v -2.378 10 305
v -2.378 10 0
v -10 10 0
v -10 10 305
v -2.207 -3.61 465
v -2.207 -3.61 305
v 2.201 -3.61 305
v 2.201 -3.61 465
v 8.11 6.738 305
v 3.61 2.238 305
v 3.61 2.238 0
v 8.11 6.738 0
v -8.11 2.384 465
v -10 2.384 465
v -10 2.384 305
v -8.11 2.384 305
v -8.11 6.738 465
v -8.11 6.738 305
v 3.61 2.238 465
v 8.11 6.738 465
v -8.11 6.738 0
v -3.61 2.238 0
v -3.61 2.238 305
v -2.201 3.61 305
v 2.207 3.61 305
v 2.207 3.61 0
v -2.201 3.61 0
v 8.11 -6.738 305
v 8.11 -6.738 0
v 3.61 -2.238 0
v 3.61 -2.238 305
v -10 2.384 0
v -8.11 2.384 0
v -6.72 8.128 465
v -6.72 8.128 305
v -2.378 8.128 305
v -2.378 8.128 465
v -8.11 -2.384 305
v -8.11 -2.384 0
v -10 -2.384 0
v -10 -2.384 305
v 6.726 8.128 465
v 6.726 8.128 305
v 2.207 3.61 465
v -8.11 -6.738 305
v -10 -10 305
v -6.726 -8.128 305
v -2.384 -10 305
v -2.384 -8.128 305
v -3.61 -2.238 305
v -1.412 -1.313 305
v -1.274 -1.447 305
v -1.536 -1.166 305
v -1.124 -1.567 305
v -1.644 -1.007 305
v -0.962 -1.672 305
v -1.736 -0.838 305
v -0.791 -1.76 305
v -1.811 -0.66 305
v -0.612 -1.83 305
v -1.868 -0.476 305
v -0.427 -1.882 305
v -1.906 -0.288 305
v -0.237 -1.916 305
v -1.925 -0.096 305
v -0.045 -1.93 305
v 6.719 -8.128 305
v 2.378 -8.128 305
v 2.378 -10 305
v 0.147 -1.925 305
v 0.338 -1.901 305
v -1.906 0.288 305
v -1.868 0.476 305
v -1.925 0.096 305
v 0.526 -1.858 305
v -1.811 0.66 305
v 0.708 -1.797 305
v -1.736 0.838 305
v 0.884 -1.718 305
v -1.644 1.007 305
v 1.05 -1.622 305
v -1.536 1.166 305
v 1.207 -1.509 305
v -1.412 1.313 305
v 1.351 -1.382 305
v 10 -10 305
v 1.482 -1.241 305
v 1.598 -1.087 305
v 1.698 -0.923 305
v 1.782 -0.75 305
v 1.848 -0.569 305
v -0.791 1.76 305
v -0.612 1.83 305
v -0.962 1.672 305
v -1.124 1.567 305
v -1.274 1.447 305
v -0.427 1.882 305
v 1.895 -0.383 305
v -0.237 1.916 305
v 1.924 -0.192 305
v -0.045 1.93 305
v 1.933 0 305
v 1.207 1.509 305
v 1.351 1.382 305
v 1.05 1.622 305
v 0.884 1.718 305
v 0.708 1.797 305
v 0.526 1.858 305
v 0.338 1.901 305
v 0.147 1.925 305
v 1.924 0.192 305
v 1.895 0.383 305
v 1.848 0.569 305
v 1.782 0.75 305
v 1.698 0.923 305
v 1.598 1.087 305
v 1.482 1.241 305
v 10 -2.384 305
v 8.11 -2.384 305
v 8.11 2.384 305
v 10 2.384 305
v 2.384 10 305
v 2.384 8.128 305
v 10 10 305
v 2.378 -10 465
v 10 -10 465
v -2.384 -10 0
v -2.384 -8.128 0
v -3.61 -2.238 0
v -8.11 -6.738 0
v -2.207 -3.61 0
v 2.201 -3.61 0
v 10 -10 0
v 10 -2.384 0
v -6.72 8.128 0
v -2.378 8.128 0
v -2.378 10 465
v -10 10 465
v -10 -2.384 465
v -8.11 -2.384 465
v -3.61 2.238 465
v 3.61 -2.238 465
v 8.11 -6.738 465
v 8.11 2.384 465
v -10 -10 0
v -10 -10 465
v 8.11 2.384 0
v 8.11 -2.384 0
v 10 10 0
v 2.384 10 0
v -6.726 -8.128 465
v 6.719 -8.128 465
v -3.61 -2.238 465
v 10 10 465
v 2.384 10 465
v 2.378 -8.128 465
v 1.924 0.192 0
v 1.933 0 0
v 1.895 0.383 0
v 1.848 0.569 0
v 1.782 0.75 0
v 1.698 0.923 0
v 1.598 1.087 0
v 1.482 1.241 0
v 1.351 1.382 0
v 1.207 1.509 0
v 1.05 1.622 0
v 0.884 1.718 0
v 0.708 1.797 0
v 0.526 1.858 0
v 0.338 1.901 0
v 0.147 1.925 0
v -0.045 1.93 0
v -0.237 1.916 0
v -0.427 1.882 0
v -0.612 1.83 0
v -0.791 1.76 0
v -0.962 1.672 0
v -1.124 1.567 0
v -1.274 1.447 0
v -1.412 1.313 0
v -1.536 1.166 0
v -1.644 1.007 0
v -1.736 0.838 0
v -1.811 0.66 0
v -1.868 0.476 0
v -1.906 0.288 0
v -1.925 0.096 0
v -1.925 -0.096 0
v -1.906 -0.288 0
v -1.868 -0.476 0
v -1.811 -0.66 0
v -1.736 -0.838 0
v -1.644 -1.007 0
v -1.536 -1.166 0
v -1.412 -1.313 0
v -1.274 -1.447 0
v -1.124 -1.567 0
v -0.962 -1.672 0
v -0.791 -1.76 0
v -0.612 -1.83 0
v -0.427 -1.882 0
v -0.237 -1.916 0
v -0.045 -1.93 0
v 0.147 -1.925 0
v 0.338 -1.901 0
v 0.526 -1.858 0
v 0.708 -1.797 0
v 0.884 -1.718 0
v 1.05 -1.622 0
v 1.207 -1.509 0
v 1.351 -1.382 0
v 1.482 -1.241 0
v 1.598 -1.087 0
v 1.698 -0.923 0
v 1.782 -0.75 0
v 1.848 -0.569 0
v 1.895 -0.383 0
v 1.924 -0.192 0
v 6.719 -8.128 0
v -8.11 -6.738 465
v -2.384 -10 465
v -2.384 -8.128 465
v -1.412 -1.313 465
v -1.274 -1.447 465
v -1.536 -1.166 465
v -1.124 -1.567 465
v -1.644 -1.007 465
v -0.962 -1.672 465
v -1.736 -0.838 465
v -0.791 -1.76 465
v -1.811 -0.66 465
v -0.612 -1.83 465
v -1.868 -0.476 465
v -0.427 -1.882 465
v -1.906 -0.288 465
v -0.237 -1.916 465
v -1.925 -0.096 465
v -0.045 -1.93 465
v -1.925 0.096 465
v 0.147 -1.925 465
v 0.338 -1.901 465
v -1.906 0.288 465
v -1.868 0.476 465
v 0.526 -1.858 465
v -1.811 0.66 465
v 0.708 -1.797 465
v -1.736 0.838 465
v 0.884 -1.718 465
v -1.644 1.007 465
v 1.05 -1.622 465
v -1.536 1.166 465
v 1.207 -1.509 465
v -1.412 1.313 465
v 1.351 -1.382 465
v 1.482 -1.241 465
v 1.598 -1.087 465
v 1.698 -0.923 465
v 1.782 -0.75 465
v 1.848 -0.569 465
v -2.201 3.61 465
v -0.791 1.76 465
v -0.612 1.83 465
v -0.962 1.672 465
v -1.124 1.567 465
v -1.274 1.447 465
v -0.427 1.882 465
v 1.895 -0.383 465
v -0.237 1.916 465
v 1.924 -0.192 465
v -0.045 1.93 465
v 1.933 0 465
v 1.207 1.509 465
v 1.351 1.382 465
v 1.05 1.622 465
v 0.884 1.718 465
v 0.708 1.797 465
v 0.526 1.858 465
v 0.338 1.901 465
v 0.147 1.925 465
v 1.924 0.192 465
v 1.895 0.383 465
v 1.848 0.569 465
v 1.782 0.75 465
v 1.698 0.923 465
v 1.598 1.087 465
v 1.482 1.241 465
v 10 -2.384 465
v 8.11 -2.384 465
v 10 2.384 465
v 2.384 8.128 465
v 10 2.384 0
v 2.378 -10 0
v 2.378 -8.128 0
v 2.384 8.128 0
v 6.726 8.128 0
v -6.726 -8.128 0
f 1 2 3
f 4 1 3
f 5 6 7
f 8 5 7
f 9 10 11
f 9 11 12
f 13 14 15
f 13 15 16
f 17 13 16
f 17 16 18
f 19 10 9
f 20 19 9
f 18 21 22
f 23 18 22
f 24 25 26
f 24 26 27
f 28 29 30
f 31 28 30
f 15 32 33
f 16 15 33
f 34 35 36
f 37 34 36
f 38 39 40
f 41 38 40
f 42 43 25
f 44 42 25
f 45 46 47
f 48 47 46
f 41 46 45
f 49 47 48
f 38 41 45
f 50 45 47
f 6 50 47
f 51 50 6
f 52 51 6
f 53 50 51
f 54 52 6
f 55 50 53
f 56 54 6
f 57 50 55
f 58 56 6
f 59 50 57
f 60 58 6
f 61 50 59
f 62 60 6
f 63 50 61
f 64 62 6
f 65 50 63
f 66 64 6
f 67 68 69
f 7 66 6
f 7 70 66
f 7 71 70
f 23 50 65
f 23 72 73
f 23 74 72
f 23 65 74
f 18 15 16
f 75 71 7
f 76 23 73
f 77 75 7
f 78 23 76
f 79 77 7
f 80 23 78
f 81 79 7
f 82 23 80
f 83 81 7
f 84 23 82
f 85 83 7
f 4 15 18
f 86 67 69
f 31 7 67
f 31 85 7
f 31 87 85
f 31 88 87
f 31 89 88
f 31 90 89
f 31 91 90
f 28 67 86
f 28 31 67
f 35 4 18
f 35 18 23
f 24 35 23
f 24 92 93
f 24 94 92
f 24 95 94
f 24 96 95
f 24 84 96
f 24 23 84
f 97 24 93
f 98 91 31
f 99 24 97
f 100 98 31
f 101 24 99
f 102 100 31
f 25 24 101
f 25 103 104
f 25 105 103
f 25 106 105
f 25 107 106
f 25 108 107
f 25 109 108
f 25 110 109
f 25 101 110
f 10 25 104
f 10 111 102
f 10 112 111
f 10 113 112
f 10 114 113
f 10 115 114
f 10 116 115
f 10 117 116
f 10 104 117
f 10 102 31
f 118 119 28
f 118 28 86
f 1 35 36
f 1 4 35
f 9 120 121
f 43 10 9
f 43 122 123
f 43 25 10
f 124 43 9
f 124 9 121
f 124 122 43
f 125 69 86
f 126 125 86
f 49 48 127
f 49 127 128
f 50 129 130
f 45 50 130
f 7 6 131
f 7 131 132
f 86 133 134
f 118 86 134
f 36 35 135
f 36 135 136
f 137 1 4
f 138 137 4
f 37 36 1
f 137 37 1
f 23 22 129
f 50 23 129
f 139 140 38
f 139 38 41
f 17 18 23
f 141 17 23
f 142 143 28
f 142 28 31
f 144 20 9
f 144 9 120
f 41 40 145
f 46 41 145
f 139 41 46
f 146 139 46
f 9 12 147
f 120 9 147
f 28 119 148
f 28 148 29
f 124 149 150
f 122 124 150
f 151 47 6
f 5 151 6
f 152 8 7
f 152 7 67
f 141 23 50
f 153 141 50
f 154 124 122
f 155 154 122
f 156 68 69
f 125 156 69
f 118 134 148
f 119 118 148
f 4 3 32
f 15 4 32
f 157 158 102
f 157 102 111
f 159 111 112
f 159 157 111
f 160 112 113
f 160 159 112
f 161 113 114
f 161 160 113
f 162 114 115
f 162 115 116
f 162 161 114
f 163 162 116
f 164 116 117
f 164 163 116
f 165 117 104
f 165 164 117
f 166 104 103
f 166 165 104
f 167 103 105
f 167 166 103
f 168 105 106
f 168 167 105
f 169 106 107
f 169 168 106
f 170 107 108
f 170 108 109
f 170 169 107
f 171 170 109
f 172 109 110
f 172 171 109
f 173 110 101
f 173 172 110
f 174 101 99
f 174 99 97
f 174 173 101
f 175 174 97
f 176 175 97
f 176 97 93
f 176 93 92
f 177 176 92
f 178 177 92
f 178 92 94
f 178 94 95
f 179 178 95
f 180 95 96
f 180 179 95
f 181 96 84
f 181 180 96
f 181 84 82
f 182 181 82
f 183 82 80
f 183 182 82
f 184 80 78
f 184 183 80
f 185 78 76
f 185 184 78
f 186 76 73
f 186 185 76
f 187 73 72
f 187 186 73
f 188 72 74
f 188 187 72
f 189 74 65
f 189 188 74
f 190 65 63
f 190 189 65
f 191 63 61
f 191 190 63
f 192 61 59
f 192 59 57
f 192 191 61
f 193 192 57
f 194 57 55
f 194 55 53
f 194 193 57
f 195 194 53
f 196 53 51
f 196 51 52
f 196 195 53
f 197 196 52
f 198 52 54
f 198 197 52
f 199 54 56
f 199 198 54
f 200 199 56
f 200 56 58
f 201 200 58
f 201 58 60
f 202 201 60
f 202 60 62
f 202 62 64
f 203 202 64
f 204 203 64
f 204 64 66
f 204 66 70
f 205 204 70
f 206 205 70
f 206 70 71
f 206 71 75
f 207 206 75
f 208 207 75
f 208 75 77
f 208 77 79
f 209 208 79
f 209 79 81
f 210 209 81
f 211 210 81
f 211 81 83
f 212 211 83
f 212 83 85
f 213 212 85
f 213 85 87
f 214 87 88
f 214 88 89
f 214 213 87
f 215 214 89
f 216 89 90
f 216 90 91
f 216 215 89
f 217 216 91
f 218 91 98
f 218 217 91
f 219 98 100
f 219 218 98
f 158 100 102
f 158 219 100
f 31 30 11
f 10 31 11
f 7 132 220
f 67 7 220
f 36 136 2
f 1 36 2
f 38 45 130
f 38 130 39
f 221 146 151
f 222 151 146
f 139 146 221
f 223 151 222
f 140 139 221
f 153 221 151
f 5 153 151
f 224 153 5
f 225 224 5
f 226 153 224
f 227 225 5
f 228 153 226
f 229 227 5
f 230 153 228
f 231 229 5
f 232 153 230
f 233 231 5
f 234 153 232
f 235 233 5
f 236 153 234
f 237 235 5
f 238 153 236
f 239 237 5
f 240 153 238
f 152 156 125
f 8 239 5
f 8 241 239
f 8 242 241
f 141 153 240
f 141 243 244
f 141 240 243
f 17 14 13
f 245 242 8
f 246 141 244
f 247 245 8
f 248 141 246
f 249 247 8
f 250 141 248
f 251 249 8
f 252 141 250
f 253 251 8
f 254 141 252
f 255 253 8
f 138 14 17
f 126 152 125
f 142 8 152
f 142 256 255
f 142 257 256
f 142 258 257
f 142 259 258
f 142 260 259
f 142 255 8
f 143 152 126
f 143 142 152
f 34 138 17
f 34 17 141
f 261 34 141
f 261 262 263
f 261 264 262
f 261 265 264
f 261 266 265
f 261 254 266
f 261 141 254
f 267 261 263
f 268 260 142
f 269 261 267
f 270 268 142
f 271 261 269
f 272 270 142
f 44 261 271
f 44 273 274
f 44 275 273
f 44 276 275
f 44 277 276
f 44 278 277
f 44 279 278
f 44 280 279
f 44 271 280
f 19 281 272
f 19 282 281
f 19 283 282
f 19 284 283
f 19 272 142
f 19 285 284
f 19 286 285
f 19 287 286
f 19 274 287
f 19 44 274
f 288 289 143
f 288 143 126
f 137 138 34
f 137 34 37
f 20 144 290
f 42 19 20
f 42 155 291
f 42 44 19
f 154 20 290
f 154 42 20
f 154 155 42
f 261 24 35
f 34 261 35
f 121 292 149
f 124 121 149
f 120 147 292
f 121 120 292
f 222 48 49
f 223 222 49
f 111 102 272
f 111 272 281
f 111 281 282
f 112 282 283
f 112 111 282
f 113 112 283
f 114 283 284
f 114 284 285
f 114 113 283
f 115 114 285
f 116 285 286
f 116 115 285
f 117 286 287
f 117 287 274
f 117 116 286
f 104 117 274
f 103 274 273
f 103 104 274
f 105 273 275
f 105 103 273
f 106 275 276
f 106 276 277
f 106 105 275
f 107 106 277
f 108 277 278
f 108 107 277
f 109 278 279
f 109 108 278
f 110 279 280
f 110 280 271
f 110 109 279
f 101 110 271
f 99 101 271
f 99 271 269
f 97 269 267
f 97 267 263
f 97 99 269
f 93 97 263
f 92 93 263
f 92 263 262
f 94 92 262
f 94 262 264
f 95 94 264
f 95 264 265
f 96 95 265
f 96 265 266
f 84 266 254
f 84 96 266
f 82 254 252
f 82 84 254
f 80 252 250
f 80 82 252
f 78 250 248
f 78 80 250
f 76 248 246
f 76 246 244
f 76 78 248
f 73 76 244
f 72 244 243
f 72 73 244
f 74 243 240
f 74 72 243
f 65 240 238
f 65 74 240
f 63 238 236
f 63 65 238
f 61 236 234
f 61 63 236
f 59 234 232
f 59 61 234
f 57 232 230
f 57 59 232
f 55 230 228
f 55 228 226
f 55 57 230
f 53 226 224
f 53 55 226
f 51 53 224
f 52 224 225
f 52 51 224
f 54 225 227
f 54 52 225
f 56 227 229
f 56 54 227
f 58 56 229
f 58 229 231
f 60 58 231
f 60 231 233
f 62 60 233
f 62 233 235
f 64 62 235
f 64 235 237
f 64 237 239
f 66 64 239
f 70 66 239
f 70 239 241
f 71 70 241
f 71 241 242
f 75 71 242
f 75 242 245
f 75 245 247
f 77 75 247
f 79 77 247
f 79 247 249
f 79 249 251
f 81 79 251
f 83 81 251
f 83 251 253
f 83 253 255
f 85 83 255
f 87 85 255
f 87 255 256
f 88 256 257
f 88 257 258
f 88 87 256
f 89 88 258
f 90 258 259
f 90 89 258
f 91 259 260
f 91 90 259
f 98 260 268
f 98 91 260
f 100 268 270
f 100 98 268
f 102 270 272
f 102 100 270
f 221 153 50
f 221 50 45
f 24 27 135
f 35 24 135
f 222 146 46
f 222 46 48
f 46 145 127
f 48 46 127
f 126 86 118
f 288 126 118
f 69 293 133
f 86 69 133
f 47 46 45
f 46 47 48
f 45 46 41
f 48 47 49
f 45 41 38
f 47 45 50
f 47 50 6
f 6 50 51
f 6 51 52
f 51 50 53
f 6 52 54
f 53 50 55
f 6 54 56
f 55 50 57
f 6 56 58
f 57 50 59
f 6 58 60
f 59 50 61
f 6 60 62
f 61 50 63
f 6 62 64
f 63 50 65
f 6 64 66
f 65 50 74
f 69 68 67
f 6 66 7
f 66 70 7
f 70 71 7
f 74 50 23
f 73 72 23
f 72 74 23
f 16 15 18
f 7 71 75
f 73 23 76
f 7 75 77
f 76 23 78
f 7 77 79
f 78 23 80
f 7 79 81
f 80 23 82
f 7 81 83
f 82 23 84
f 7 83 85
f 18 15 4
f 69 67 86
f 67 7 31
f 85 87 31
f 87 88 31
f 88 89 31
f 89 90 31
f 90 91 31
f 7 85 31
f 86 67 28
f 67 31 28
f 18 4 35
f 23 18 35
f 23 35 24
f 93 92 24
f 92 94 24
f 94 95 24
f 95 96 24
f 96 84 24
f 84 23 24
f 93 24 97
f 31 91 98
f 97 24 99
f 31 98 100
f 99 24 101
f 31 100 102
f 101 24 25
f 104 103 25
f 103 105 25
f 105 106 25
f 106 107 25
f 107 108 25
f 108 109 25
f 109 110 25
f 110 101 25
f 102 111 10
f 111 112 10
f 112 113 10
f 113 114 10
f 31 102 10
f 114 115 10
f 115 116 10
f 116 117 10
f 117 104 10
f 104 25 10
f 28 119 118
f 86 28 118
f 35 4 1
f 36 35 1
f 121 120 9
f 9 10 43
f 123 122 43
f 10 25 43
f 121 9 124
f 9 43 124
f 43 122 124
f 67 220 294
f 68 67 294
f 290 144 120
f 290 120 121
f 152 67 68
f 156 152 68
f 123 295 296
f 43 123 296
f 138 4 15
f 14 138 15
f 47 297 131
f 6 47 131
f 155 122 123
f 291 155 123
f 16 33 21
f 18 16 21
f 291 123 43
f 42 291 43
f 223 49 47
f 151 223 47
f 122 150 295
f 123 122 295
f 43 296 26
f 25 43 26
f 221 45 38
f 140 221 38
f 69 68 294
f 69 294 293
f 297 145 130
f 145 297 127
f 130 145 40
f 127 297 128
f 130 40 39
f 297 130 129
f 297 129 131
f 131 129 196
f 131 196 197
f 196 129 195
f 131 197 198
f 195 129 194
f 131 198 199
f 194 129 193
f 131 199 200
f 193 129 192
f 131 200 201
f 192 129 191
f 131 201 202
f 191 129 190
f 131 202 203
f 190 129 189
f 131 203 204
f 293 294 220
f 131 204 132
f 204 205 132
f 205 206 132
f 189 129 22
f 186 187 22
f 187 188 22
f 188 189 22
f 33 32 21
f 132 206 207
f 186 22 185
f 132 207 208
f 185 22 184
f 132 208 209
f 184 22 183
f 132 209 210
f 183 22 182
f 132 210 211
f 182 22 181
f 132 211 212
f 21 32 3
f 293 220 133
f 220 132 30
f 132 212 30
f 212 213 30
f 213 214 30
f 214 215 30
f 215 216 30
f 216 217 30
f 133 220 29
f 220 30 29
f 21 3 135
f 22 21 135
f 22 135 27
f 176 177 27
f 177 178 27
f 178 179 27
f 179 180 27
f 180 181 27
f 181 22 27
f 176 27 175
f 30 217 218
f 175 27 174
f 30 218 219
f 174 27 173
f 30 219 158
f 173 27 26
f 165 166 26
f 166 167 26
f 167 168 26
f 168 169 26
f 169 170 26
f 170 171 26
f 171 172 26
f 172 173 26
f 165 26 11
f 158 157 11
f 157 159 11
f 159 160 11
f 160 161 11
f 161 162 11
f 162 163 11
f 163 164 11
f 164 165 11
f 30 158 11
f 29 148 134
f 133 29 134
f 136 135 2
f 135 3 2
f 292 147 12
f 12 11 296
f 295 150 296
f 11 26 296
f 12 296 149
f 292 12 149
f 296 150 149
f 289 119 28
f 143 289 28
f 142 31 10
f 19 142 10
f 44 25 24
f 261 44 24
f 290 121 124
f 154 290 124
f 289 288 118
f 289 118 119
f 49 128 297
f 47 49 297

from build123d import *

# Parameters (mm, degrees)
F0_R      = 1.930485
F1_DEPTH  = 305
F1_FACE_R = 1.930485
F2_DEPTH  = 160


with BuildPart() as f1:
    # F0 (on Top) → F1 (new body)
    with BuildSketch(Plane.XY):
        Polygon((2.207242, 3.60976), (-2.201298, 3.60976), (-6.719596, 8.128045), (-2.378139, 8.128045), (-2.378139, 9.999997), (-10.000081, 9.999997), (-10.000081, 2.38414), (-8.10984, 2.38414), (-8.10984, 6.737804), (-3.609838, 2.237799), (-3.609838, -2.237799), (-8.10984, -6.737801), (-8.10984, -2.384142), (-10.000081, -2.384142), (-10.000081, -10.000001), (-2.384238, -10.000001), (-2.384238, -8.128041), (-6.725692, -8.128041), (-2.207397, -3.609759), (2.201143, -3.609759), (6.719422, -8.128041), (2.377962, -8.128041), (2.377962, -10.000001), (9.999922, -10.000001), (9.999922, -2.384142), (8.109683, -2.384142), (8.109683, -6.737801), (3.609663, -2.237799), (3.609663, 2.237799), (8.109683, 6.737804), (8.109683, 2.38414), (9.999922, 2.38414), (9.999922, 9.999997), (2.384063, 9.999997), (2.384063, 8.128045), (6.725523, 8.128045), align=None)
        with Locations((0.002972, 0)):
            Circle(F0_R, mode=Mode.SUBTRACT)
    extrude(amount=F1_DEPTH)


with BuildPart() as f2:
    # F1_face (on face) → F2 (new body)
    with BuildSketch(Plane(origin=(-0.000268, -5e-06, 305), x_dir=(1, 0, 0), z_dir=(0, 0, 1))):
        Polygon((2.37823, -9.999996), (10.000191, -9.999996), (10.000191, -2.384136), (8.109951, -2.384136), (8.109951, -6.737796), (3.609932, -2.237794), (3.609932, 2.237805), (8.109951, 6.737809), (8.109951, 2.384145), (10.000191, 2.384145), (10.000191, 10.000002), (2.384331, 10.000002), (2.384331, 8.12805), (6.725791, 8.12805), (2.20751, 3.609765), (-2.20103, 3.609765), (-6.719327, 8.12805), (-2.377871, 8.12805), (-2.377871, 10.000002), (-9.999813, 10.000002), (-9.999813, 2.384145), (-8.109571, 2.384145), (-8.109571, 6.737809), (-3.60957, 2.237805), (-3.60957, -2.237794), (-8.109571, -6.737796), (-8.109571, -2.384136), (-9.999813, -2.384136), (-9.999813, -9.999996), (-2.383969, -9.999996), (-2.383969, -8.128035), (-6.725423, -8.128035), (-2.207129, -3.609754), (2.201411, -3.609754), (6.71969, -8.128035), (2.37823, -8.128035), align=None)
        with Locations((0.00324, 5e-06)):
            Circle(F1_FACE_R, mode=Mode.SUBTRACT)
    extrude(amount=F2_DEPTH)


solid = Compound([f1.part, f2.part])
